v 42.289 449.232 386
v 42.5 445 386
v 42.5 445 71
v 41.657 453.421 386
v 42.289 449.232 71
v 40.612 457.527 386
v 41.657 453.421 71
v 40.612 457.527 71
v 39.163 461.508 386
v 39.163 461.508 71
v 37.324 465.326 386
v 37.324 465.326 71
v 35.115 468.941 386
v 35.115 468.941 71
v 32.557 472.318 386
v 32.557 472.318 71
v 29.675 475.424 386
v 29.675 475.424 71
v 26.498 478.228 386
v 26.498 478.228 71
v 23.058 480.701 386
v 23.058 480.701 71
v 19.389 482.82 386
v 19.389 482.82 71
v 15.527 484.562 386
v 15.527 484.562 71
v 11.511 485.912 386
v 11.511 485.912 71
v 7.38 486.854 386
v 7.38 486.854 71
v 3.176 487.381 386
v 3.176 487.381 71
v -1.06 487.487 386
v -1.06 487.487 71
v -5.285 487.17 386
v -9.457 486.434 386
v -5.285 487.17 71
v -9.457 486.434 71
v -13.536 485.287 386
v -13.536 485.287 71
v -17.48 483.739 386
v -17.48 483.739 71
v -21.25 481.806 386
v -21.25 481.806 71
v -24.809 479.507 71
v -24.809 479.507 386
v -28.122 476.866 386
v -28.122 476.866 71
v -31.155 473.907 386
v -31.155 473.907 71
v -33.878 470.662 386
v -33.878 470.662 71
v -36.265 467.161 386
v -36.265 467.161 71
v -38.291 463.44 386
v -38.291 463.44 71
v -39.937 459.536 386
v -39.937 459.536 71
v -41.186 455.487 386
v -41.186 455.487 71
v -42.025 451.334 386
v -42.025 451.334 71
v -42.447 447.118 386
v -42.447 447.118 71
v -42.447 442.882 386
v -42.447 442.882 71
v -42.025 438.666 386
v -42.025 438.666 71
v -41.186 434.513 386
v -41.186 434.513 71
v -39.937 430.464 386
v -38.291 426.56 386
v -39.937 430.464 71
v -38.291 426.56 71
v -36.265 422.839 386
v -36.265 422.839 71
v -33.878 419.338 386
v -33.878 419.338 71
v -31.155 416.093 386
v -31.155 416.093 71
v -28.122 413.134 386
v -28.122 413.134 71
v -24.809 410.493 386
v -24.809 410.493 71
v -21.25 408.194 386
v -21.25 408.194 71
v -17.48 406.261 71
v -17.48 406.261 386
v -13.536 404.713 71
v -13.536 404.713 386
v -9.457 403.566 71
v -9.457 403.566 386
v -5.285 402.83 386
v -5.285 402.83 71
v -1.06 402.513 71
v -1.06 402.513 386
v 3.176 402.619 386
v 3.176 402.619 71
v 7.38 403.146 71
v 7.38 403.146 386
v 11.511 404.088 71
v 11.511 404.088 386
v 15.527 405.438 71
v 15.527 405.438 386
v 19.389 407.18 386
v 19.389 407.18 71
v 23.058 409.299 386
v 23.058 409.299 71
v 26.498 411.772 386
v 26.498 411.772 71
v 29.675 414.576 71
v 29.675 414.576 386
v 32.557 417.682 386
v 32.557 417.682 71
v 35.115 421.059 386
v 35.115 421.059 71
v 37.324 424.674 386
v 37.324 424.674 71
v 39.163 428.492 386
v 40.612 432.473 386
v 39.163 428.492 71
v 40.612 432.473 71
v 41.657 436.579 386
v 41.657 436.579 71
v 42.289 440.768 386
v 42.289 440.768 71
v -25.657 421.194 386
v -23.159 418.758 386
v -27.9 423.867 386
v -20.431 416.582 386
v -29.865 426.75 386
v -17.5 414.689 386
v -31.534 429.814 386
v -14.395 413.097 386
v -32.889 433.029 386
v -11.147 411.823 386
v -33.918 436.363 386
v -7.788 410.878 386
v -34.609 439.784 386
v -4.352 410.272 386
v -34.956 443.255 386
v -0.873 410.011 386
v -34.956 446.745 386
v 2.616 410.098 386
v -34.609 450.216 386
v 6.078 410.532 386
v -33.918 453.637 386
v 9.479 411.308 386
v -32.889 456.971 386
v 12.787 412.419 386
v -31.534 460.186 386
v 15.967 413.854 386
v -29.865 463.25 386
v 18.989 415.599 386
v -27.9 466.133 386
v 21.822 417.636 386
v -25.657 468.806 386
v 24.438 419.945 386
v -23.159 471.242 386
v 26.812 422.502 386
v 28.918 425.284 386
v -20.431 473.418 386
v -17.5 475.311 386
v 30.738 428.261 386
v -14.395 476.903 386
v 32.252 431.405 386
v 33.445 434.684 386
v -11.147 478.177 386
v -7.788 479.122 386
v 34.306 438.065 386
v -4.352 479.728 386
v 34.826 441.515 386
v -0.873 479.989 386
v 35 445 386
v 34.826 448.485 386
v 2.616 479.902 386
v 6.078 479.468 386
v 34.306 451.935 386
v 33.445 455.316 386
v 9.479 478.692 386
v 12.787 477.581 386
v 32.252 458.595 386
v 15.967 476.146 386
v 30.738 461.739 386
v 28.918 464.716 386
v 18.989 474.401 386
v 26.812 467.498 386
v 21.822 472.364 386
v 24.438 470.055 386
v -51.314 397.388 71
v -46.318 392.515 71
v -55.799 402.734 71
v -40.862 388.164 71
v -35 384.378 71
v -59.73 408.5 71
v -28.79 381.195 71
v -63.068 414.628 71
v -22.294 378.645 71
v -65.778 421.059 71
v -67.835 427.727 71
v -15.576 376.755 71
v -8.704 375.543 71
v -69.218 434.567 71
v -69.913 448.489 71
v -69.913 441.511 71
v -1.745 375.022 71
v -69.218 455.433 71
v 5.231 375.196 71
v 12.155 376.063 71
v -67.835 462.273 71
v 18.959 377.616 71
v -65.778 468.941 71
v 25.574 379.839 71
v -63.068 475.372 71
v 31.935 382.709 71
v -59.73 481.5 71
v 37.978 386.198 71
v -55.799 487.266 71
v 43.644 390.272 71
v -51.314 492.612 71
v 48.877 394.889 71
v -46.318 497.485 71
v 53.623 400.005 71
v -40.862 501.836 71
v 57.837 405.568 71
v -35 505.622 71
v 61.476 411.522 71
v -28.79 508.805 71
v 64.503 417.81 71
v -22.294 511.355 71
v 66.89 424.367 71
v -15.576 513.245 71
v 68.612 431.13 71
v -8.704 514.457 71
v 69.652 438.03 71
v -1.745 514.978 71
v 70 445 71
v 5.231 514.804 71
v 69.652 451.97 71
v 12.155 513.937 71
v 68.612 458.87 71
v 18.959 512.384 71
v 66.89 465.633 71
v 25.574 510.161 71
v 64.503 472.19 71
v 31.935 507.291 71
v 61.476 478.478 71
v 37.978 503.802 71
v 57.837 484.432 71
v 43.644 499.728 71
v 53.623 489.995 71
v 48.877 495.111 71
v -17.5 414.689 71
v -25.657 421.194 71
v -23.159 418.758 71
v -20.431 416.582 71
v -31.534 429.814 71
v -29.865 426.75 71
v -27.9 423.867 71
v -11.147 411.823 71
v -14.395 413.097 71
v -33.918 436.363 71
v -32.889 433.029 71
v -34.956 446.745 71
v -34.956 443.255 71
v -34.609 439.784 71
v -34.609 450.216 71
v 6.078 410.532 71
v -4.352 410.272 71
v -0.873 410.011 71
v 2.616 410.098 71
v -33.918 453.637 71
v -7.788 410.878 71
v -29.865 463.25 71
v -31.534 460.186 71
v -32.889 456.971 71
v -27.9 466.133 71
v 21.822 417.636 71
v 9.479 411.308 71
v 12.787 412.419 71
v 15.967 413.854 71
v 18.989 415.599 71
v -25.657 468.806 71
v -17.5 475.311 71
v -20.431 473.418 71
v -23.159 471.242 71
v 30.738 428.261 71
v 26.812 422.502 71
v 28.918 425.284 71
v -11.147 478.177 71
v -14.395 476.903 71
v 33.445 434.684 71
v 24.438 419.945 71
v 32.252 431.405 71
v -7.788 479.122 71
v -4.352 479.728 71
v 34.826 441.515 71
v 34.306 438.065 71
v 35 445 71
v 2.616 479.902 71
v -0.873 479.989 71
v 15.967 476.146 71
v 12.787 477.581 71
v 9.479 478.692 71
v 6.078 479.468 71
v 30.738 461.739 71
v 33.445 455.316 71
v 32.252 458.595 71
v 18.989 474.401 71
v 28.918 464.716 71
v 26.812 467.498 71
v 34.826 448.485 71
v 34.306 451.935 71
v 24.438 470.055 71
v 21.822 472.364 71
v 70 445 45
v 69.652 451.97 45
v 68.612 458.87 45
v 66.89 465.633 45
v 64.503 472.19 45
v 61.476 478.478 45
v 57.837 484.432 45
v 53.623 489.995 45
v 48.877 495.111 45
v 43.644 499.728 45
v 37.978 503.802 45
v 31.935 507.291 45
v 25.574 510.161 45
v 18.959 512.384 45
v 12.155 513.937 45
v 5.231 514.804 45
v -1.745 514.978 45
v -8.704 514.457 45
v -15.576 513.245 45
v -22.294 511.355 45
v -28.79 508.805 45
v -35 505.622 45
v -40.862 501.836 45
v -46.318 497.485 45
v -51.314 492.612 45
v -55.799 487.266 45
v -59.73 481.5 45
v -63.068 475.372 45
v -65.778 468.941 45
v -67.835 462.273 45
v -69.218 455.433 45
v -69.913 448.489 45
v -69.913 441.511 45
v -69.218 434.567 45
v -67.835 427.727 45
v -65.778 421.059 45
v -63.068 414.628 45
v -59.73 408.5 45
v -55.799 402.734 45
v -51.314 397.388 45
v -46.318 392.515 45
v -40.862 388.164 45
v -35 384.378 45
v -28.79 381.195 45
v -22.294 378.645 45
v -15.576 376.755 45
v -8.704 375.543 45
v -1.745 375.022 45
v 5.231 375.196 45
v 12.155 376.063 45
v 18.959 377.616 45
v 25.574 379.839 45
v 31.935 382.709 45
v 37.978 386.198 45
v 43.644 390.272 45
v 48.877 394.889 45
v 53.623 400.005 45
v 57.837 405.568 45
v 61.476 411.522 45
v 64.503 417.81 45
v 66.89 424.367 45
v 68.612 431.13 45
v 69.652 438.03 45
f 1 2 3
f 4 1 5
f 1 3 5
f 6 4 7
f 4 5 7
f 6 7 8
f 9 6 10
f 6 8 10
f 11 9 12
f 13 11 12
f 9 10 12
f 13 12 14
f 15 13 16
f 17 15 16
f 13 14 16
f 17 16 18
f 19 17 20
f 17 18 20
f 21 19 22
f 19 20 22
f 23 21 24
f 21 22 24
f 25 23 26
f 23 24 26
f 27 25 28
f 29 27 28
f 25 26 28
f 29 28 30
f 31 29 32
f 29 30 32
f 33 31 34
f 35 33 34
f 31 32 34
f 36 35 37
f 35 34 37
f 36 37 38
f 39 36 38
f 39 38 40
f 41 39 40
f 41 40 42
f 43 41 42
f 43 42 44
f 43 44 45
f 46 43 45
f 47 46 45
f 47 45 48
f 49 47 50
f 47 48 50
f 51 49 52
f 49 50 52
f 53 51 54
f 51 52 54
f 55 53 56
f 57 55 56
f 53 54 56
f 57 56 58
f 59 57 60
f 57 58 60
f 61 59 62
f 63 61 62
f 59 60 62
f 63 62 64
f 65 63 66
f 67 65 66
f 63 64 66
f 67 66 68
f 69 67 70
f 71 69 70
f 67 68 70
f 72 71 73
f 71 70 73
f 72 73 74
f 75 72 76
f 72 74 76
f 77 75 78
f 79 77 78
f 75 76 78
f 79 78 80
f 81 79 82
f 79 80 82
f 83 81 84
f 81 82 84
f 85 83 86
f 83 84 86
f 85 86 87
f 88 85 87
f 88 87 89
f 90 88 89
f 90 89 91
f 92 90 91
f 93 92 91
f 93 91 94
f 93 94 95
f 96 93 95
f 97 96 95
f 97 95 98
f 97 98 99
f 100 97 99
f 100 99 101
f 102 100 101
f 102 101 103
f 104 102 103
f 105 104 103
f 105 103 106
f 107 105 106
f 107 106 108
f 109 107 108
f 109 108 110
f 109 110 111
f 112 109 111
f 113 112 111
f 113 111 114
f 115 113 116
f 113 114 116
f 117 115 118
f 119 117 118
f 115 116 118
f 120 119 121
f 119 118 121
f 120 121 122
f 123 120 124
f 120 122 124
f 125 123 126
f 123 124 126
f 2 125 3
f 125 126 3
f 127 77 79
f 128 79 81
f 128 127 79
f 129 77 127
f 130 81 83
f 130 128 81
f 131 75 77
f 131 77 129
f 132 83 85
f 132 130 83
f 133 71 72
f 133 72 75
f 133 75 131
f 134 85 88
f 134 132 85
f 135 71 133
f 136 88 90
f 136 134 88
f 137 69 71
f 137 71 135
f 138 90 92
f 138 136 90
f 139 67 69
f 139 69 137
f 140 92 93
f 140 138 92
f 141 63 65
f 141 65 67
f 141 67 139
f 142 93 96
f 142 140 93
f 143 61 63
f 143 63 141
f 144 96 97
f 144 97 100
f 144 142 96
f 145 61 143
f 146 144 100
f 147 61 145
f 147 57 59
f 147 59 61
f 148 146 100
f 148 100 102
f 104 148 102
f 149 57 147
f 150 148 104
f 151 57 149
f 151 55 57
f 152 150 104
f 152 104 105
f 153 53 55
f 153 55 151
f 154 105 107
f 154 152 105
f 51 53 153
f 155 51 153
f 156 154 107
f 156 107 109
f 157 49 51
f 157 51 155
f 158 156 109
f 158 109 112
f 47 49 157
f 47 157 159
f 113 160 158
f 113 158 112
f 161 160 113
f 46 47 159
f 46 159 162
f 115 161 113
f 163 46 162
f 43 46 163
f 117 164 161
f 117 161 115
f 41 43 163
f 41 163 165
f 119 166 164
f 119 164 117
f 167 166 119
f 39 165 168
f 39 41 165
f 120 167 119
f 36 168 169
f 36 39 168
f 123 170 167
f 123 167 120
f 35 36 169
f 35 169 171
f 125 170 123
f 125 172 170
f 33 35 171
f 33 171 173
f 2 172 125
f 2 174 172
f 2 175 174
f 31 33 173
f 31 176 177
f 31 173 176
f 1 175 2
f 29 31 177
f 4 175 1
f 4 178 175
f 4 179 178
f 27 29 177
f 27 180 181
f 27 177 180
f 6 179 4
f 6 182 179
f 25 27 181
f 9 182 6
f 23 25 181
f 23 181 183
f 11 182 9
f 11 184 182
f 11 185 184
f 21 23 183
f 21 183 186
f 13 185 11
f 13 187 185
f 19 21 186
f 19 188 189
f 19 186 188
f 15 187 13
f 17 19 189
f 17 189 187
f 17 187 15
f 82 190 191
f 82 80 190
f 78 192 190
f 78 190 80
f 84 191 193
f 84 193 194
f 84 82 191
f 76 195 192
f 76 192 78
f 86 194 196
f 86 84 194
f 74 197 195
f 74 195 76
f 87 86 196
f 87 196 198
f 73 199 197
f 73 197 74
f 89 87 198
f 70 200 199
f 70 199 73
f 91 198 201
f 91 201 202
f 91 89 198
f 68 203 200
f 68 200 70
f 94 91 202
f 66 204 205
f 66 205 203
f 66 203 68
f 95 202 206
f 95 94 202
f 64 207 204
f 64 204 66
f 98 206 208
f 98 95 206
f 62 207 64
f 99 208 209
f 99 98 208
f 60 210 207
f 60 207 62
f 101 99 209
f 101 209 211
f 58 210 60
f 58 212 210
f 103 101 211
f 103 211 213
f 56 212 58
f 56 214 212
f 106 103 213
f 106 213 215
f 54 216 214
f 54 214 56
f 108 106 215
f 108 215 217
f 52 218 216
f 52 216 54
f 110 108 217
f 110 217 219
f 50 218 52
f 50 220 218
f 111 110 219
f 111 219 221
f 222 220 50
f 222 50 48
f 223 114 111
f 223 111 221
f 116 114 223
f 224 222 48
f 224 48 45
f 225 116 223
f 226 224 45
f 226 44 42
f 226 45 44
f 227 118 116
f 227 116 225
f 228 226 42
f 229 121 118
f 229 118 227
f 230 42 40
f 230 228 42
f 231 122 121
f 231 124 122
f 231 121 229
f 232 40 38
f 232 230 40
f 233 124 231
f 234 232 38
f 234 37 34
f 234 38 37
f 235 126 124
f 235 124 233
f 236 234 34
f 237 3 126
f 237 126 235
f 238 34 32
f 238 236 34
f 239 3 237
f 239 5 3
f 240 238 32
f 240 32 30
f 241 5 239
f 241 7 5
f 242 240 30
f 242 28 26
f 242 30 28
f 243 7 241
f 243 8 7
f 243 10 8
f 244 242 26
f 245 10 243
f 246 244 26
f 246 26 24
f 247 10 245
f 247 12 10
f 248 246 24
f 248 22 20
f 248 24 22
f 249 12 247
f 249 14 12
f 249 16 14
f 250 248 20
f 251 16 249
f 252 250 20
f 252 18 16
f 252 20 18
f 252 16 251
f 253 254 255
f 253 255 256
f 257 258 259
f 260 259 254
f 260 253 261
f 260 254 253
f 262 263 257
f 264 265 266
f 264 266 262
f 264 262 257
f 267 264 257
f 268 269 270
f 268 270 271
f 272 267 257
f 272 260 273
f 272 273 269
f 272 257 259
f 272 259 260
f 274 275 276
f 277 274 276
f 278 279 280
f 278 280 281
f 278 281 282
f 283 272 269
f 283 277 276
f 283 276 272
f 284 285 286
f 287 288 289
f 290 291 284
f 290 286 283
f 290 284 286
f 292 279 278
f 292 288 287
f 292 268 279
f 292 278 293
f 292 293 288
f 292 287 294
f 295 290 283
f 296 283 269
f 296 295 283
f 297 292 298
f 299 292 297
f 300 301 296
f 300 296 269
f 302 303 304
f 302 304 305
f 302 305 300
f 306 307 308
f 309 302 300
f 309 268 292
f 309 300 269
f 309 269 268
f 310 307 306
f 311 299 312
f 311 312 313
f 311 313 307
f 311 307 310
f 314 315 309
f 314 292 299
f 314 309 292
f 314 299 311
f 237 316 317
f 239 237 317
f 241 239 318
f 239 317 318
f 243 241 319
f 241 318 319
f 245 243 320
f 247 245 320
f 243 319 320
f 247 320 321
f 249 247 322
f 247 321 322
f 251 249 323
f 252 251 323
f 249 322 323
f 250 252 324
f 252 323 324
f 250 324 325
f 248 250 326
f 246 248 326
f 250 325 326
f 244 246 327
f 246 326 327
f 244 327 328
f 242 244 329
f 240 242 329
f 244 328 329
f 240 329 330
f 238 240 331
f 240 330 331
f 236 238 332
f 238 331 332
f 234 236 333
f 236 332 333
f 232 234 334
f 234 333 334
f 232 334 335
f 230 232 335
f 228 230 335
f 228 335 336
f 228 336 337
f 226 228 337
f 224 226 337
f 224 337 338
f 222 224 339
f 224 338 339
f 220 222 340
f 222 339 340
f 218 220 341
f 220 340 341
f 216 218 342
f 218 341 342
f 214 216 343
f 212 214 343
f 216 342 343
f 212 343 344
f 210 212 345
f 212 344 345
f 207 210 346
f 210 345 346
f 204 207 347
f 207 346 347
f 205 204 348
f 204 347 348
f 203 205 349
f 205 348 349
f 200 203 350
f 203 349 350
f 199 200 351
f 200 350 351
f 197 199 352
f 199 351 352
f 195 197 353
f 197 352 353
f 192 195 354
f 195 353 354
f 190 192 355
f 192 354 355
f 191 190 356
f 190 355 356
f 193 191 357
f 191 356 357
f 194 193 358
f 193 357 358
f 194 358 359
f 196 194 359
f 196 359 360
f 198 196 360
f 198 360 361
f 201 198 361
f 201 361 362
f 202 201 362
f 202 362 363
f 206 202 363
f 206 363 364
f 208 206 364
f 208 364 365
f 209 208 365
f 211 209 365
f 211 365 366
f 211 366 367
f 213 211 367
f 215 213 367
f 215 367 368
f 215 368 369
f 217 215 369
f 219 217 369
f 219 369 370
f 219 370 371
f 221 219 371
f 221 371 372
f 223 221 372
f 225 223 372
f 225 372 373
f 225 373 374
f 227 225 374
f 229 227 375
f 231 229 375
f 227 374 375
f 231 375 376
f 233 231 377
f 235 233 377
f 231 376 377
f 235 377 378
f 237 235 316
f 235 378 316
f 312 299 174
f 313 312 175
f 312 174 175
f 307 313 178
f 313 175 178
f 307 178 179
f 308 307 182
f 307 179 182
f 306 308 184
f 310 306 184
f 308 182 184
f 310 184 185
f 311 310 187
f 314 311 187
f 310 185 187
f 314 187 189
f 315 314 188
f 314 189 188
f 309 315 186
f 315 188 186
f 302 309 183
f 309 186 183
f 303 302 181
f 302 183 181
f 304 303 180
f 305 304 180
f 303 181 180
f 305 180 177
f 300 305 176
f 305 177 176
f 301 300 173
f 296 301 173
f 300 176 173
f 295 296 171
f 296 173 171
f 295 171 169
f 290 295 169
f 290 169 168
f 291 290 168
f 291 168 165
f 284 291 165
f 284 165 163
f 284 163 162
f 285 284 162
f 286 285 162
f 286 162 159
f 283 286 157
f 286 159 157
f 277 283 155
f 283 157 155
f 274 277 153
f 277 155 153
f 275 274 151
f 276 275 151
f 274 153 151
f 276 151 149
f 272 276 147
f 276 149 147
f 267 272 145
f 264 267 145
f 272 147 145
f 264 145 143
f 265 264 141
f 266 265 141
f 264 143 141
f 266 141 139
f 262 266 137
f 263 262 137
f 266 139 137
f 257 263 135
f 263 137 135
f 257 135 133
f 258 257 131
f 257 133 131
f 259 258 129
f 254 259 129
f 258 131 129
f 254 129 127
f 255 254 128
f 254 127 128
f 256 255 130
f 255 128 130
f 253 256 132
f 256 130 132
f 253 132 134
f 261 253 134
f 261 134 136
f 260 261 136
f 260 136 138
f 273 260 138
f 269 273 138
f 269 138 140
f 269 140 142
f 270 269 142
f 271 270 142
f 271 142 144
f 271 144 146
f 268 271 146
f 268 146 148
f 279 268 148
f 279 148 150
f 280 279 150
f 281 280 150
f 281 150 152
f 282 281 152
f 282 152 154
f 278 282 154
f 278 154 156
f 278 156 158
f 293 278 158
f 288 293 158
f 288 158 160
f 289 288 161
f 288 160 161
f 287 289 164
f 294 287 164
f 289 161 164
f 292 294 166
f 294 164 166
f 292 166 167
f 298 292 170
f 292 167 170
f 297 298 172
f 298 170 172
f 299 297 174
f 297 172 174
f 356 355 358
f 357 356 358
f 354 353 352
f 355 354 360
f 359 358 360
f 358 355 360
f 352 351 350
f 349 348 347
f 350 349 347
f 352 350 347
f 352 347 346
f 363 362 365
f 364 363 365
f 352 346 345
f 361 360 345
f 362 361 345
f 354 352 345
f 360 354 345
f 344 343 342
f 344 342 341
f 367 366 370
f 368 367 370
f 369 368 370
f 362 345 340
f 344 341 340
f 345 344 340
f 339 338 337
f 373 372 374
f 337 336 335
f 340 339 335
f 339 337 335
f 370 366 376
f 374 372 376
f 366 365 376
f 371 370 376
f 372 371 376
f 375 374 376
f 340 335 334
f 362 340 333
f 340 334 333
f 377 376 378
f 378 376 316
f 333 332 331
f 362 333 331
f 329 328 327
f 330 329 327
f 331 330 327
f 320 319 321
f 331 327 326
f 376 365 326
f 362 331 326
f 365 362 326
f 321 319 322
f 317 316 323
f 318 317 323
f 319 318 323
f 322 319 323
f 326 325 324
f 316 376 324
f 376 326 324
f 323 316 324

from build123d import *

# Parameters (mm, degrees)
SKETCH003_R     = 70
PAD001_DEPTH    = 26
SKETCH004_R     = 42.5
PAD002_DEPTH    = 315
SKETCH005_R     = 35
POCKET002_DEPTH = 315


with BuildPart() as part:
    # Sketch003 → Pad001 (new body)
    with BuildSketch(Plane.XY):
        Circle(SKETCH003_R)
    extrude(amount=PAD001_DEPTH)

    # Sketch004 (on Face3 of Pad001) → Pad002 (join)
    with BuildSketch(Plane.XY.offset(26)):
        Circle(SKETCH004_R)
    extrude(amount=PAD002_DEPTH)

    # Sketch005 (on Face5 of Pad002) → Pocket002 (cut)
    with BuildSketch(Plane.XY.offset(341)):
        Circle(SKETCH005_R)
    extrude(amount=-POCKET002_DEPTH, mode=Mode.SUBTRACT)


with BuildPart() as part_1:
    # Body001 placement: moved
    add(part.part.moved(Location((0, 445, 45))))


solid = part_1.part
